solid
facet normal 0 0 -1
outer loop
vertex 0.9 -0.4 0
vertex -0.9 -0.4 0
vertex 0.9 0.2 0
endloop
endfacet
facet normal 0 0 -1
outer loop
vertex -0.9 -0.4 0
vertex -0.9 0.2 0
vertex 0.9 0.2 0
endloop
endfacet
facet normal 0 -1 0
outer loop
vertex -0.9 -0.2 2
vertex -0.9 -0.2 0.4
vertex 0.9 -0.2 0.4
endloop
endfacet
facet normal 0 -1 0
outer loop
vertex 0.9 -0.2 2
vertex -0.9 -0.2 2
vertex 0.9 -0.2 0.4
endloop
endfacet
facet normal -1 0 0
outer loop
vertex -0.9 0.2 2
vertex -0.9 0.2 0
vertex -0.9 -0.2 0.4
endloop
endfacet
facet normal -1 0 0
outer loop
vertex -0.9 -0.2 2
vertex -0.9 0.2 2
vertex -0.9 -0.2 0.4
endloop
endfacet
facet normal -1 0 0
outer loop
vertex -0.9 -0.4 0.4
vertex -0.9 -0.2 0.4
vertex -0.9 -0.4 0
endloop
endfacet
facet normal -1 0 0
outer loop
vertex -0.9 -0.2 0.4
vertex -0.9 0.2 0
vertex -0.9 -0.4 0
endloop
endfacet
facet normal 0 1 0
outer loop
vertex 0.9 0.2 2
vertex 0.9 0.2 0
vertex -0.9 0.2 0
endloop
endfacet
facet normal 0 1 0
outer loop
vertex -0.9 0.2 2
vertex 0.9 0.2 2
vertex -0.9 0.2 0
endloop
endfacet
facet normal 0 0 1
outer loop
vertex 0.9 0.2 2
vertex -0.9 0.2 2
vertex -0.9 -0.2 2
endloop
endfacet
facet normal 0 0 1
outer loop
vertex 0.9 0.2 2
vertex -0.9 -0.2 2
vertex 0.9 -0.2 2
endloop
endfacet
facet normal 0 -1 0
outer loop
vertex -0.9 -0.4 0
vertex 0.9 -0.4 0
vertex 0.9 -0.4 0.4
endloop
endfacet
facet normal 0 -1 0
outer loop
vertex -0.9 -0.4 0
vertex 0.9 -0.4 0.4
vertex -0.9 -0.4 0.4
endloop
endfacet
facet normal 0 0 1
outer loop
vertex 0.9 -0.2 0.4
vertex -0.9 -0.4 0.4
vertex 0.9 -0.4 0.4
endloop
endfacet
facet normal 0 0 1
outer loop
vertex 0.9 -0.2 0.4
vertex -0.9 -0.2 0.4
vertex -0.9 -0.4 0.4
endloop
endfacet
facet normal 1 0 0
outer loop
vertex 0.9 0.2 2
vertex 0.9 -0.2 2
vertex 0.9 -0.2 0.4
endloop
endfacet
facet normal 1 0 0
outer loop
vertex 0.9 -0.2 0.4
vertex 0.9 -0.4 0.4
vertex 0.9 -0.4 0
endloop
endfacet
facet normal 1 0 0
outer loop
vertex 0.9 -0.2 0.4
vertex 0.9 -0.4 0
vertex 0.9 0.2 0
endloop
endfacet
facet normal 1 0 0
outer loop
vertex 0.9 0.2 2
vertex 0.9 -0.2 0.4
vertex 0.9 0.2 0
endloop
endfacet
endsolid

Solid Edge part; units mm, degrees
sketch "Sketch1" plane through (0, 0, 0) normal (0, 0, 1) x (1, 0, 0)
  line L0 (-0.9, -0.2) -> (0.9, -0.2)
  line L1 (0.9, -0.2) -> (0.9, 0.2)
  line L2 (0.9, 0.2) -> (-0.9, 0.2)
  line L3 (-0.9, 0.2) -> (-0.9, -0.2)
  dimension "D1" = 0.4
  dimension "D2" = 1.8
extrude "Protrusion1" add sketch "Sketch1" along normal blind 2
sketch "Sketch2" plane through (0, 0, 0) normal (0, 0, -1) x (-1, 0, 0)
  line L0 (0.9, -0.2) -> (0.9, -0.4)
  line L1 (-0.9, -0.4) -> (0.9, -0.4)
  line L2 (-0.9, -0.4) -> (-0.9, -0.2)
  line L3 (0.9, -0.2) -> (-0.9, -0.2)
extrude "Ausprägung_2" add sketch "Sketch2" against normal blind 0.4
